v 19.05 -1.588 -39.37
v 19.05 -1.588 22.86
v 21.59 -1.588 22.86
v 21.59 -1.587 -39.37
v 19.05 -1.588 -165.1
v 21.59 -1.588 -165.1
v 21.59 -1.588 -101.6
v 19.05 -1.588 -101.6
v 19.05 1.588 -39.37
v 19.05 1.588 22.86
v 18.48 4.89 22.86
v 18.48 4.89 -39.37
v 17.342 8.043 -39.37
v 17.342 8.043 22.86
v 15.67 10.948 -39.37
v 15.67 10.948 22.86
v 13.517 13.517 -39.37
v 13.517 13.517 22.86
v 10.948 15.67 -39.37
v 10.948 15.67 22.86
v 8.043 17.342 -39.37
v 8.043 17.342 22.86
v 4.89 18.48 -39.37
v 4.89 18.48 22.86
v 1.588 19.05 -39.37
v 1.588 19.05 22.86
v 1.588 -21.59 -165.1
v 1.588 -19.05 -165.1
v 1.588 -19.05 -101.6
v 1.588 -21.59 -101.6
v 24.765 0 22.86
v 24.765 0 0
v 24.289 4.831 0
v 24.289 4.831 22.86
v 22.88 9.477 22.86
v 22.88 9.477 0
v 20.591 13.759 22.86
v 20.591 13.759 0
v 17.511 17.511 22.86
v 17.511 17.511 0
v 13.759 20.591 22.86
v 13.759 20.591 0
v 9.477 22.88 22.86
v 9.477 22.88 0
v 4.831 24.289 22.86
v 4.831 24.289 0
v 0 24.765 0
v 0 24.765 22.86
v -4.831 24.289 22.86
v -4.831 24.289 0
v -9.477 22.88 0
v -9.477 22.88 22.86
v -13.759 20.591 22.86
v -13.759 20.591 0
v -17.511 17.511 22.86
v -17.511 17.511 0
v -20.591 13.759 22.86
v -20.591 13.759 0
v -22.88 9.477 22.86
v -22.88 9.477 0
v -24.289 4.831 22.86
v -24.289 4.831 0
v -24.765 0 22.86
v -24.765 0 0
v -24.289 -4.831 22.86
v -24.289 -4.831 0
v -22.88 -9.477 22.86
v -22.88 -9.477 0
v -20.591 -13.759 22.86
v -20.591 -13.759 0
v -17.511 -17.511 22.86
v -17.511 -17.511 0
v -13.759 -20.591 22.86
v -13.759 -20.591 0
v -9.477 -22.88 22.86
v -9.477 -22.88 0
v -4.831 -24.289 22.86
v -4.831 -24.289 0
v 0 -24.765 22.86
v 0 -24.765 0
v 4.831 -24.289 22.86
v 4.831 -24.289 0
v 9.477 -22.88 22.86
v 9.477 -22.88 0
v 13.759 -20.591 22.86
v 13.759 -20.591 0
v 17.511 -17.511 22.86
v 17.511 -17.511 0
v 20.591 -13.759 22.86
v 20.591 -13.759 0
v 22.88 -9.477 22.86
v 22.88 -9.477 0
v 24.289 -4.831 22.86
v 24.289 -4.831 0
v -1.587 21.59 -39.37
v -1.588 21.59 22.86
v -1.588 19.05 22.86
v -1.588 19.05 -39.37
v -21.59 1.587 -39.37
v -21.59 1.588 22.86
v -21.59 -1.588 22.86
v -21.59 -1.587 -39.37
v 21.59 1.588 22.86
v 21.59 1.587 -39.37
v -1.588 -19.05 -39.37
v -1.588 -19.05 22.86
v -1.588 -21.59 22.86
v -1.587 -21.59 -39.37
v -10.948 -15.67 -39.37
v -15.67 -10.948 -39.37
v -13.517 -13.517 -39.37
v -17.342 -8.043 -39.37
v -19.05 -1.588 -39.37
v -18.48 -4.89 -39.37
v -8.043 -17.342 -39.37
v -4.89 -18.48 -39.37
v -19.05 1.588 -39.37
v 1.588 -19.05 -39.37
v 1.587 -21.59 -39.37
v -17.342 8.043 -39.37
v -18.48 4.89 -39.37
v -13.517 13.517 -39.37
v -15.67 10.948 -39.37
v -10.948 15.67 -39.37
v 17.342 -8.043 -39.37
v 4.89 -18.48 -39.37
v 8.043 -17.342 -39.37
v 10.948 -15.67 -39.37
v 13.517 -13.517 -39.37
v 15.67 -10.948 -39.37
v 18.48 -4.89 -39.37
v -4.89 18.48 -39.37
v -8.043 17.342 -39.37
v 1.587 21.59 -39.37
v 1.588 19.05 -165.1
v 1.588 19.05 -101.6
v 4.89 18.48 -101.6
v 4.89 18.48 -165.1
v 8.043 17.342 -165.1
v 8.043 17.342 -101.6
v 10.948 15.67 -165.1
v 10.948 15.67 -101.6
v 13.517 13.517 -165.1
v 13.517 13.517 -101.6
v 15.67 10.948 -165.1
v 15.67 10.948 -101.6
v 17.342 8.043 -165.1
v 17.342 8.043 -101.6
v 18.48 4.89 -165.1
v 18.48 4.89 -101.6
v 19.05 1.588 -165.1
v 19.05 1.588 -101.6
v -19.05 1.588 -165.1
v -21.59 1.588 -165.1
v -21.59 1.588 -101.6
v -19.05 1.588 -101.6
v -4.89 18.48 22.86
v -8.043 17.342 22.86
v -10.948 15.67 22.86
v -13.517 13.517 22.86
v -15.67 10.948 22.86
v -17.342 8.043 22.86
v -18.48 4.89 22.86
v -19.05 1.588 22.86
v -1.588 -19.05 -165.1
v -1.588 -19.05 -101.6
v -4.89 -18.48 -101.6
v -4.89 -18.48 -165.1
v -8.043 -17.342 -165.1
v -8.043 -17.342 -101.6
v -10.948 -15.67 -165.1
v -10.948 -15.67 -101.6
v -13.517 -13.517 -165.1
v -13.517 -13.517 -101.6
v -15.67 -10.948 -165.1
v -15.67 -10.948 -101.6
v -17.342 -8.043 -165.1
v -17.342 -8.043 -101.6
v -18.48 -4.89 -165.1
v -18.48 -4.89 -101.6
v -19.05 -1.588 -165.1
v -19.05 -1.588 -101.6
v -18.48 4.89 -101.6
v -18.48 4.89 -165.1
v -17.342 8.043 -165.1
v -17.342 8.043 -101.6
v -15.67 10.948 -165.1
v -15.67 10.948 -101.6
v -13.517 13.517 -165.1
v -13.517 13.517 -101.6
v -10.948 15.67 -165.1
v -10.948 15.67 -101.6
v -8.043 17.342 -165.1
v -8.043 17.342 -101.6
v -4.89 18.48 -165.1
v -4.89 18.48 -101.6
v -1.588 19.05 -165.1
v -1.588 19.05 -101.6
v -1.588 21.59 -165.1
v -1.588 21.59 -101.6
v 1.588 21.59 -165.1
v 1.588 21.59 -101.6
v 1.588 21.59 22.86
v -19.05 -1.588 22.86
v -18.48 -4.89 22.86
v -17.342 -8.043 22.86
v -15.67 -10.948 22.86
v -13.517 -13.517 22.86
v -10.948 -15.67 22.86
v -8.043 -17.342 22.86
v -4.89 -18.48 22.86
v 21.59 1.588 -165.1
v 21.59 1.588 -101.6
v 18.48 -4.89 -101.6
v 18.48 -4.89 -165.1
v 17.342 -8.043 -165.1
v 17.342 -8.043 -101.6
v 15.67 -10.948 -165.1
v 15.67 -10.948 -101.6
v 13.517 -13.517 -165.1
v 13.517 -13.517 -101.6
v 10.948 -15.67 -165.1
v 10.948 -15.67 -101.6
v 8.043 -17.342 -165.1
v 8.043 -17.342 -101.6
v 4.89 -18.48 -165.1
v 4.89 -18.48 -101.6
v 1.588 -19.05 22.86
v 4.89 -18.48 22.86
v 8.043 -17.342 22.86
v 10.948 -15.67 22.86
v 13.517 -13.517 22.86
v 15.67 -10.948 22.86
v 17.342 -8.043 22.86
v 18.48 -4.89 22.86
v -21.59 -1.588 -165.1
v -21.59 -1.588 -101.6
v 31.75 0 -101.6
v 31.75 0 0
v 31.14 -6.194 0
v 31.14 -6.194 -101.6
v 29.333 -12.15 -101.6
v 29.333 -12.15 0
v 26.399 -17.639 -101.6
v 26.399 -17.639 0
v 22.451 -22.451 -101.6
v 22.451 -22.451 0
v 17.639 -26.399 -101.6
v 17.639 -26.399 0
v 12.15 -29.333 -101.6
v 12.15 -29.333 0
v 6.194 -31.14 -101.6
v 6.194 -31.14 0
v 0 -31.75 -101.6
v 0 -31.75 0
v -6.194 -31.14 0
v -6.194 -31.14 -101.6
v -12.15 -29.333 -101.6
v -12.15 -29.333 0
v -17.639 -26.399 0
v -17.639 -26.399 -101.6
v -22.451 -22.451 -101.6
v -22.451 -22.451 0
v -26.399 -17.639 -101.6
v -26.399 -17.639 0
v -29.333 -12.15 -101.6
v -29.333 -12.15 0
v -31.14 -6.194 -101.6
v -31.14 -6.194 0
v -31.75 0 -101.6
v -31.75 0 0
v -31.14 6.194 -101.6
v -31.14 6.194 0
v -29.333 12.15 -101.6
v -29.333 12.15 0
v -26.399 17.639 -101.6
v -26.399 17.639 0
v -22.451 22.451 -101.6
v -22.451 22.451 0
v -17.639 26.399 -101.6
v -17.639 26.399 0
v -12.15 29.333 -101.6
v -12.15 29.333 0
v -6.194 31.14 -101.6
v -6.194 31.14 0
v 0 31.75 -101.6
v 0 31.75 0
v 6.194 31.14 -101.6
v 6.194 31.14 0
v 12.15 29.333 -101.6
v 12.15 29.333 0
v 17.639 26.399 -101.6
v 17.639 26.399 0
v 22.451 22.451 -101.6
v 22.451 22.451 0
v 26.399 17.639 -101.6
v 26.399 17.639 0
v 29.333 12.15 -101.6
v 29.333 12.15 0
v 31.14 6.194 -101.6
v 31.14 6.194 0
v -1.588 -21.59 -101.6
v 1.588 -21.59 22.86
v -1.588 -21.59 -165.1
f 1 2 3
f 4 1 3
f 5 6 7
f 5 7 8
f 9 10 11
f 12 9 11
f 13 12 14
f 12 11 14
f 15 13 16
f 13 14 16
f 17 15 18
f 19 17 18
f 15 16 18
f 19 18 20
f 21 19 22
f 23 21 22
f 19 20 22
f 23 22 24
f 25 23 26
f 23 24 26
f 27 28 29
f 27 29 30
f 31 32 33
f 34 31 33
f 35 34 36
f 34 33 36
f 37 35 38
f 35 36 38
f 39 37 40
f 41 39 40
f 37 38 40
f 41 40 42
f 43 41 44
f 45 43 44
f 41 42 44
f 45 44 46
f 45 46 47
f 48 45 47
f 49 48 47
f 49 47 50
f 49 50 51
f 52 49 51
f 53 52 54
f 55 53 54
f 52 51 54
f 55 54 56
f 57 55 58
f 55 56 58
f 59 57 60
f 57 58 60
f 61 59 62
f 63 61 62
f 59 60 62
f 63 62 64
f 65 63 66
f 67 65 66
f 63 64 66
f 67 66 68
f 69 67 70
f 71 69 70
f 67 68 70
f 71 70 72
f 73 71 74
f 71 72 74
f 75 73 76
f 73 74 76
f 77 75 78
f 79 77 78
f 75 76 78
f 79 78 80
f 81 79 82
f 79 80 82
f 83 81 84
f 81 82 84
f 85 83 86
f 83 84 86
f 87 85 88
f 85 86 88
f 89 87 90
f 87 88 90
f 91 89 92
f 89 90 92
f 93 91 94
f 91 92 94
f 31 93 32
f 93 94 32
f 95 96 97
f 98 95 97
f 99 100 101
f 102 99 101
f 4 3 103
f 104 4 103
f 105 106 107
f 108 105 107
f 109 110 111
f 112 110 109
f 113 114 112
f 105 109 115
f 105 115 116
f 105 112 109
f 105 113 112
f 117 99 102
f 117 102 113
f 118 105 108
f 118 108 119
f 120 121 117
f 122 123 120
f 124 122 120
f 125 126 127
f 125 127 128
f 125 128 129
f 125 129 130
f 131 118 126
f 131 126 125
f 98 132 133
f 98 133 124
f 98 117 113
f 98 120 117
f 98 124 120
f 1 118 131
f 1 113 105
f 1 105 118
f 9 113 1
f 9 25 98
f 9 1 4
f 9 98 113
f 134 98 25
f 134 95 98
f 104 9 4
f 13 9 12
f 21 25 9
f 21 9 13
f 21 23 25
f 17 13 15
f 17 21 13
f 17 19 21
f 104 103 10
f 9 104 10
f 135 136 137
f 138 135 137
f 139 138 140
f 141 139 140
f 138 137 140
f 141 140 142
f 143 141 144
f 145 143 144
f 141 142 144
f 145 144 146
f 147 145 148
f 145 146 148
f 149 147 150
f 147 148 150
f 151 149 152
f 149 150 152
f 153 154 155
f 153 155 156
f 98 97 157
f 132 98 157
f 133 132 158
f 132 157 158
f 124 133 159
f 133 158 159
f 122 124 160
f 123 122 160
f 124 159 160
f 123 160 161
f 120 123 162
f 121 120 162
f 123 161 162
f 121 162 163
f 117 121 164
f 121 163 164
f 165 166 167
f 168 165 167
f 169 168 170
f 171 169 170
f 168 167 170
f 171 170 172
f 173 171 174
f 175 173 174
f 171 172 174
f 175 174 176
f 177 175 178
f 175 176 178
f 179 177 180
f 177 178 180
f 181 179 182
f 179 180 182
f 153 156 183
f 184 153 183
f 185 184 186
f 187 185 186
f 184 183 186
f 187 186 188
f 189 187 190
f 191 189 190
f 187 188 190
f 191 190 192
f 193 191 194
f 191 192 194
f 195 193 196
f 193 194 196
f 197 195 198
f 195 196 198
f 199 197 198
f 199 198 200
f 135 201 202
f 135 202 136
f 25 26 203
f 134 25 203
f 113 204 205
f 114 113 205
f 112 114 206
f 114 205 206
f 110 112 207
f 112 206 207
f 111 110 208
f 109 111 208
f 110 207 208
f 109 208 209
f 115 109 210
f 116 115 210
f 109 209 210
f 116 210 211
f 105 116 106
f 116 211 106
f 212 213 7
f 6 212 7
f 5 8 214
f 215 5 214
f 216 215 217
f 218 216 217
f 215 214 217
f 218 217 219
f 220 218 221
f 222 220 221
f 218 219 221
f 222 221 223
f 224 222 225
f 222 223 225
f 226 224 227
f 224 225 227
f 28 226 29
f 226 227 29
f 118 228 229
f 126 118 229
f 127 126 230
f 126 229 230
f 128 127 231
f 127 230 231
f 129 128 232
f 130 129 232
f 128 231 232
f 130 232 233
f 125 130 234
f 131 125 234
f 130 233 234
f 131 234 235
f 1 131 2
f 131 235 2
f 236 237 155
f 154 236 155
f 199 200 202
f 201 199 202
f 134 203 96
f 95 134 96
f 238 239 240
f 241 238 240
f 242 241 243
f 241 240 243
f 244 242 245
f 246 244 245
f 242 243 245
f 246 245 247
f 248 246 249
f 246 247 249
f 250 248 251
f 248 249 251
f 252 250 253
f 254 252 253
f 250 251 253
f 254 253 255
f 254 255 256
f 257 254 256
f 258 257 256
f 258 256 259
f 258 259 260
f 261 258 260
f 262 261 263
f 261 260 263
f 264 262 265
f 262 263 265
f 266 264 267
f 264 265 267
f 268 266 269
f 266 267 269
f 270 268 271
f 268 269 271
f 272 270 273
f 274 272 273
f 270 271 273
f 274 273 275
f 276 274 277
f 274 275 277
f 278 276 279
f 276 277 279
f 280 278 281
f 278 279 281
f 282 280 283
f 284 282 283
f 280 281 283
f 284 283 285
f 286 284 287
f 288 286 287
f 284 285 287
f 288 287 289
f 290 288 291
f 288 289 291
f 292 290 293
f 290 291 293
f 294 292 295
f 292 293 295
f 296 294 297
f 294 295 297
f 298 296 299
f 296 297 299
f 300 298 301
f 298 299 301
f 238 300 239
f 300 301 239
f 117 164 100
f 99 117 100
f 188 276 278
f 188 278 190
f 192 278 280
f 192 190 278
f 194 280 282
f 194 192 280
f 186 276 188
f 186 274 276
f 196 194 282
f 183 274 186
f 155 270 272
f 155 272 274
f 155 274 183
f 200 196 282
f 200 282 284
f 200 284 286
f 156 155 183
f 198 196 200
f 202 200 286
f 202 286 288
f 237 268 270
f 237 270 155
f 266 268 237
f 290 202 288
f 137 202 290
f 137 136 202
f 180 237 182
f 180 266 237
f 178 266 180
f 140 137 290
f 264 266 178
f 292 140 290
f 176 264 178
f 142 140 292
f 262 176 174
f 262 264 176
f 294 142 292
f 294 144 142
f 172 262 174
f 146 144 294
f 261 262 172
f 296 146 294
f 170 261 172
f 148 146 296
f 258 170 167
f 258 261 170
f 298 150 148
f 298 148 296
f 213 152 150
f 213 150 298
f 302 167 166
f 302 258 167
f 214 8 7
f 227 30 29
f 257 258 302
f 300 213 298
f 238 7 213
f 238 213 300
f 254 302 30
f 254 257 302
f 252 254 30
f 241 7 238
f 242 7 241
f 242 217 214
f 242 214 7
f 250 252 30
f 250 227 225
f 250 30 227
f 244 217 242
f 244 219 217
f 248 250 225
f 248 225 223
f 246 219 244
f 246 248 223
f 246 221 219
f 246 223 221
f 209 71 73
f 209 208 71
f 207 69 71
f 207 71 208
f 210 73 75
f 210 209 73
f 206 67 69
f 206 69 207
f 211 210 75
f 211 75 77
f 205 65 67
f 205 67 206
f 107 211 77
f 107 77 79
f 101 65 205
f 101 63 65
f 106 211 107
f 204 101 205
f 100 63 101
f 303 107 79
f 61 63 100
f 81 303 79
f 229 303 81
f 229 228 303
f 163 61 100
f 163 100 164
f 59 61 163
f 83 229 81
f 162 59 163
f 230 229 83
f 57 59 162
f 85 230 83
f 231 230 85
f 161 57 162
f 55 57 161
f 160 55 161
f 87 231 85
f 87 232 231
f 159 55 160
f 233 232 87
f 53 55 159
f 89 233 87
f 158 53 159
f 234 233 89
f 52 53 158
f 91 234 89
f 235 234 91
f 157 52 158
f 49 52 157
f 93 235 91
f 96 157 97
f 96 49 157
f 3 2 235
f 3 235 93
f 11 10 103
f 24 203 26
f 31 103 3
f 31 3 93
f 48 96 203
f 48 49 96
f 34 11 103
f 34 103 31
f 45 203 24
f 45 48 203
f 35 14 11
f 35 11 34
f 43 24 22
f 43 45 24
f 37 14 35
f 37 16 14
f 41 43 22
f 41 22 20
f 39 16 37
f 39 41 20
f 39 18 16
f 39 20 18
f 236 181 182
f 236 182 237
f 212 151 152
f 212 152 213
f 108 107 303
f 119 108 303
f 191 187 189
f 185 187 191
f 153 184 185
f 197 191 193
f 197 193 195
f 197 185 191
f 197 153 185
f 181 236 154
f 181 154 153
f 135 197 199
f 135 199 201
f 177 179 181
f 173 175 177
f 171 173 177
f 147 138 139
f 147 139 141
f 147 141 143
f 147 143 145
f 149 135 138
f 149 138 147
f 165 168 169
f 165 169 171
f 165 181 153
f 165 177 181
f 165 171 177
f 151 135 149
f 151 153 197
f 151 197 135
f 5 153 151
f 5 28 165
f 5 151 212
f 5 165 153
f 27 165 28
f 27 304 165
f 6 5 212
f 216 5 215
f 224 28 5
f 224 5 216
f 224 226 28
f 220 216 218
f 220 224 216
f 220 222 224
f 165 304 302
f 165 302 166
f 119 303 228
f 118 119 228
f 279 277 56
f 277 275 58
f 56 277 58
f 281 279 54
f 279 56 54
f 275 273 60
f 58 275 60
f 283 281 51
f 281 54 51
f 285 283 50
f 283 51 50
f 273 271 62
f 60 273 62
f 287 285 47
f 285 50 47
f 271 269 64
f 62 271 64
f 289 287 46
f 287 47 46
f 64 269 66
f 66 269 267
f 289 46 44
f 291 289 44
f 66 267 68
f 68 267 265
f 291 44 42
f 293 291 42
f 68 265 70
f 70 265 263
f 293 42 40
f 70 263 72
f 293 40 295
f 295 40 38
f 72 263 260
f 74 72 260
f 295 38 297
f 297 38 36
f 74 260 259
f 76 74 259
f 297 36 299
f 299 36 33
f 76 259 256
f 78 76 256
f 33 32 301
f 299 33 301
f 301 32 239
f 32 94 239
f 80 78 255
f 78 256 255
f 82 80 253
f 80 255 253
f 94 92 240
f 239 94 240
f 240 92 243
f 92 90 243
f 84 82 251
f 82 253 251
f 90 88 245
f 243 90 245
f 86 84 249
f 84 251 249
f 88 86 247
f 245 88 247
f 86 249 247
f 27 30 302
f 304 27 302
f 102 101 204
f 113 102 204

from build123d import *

# Parameters (mm, degrees)
F0_R     = 24.765
F1_DEPTH = 22.86
F2_R     = 31.75
F2_R_2   = 24.765
F3_DEPTH = 101.6
F6_DEPTH = 62.23
F7_DEPTH = 63.5


# Not quite as in the source:
# - a pattern or mirror of a feature is missing from the dataset's text; its kind, count and spacing are read off the source's solid


with BuildPart() as f1:
    # F0 (on Top) → F1 (new body)
    with BuildSketch(Plane.XY):
        Circle(F0_R)
    extrude(amount=F1_DEPTH)

    # F2 (on face) → F3 (join)
    with BuildSketch(Plane(origin=(0, 0, 0), x_dir=(1, 0, 0), z_dir=(0, 0, -1))):
        Circle(F2_R)
        Circle(F2_R_2, mode=Mode.SUBTRACT)
        Circle(F2_R_2)
    extrude(amount=F3_DEPTH)

    # F5 (on face) → F6 (cut)
    with BuildSketch(Plane.XY.offset(22.86)):
        with BuildLine():
            Line((-21.59, 1.5875), (-21.59, 0))
            Line((-21.59, 0), (-21.59, -1.5875))
            Line((-21.59, -1.5875), (-19.05, -1.5875))
            ThreePointArc((-19.05, -1.5875), (-13.517075428, -13.517075428), (-1.5875, -19.05))
            Line((-1.5875, -19.05), (-1.5875, -21.59))
            Line((-1.5875, -21.59), (1.5875, -21.59))
            Line((1.5875, -21.59), (1.5875, -19.05))
            ThreePointArc((1.5875, -19.05), (13.517075428, -13.517075428), (19.05, -1.5875))
            Line((19.05, -1.5875), (21.59, -1.5875))
            Line((21.59, -1.5875), (21.59, 0))
            Line((21.59, 0), (21.59, 1.5875))
            Line((21.59, 1.5875), (19.05, 1.5875))
            ThreePointArc((19.05, 1.5875), (13.517075428, 13.517075428), (1.5875, 19.05))
            Line((1.5875, 19.05), (1.5875, 21.59))
            Line((1.5875, 21.59), (-1.5875, 21.59))
            Line((-1.5875, 21.59), (-1.5875, 19.05))
            ThreePointArc((-1.5875, 19.05), (-13.517075428, 13.517075428), (-19.05, 1.5875))
            Line((-19.05, 1.5875), (-21.59, 1.5875))
        make_face()
    extrude(amount=-F6_DEPTH, mode=Mode.SUBTRACT)

    # F4 (on face) → F7 (join)
    with BuildSketch(Plane(origin=(0, 0, -101.6), x_dir=(1, 0, 0), z_dir=(0, 0, -1))):
        with BuildLine():
            Line((-21.59, 1.5875), (-21.59, 0))
            Line((-21.59, 0), (-21.59, -1.5875))
            Line((-21.59, -1.5875), (-19.05, -1.5875))
            ThreePointArc((-19.05, -1.5875), (-13.517075428, -13.517075428), (-1.5875, -19.05))
            Line((-1.5875, -19.05), (-1.5875, -21.59))
            Line((-1.5875, -21.59), (1.5875, -21.59))
            Line((1.5875, -21.59), (1.5875, -19.05))
            ThreePointArc((1.5875, -19.05), (13.517075428, -13.517075428), (19.05, -1.5875))
            Line((19.05, -1.5875), (21.59, -1.5875))
            Line((21.59, -1.5875), (21.59, 0))
            Line((21.59, 0), (21.59, 1.5875))
            Line((21.59, 1.5875), (19.05, 1.5875))
            ThreePointArc((19.05, 1.5875), (13.517075428, 13.517075428), (1.5875, 19.05))
            Line((1.5875, 19.05), (1.5875, 21.59))
            Line((1.5875, 21.59), (-1.5875, 21.59))
            Line((-1.5875, 21.59), (-1.5875, 19.05))
            ThreePointArc((-1.5875, 19.05), (-13.517075428, 13.517075428), (-19.05, 1.5875))
            Line((-19.05, 1.5875), (-21.59, 1.5875))
        make_face()
    f7 = extrude(amount=F7_DEPTH)

    # F7_copies: F7 across plane
    add(f7.mirror(Plane.XY.offset(-102.235)))


solid = f1.part
